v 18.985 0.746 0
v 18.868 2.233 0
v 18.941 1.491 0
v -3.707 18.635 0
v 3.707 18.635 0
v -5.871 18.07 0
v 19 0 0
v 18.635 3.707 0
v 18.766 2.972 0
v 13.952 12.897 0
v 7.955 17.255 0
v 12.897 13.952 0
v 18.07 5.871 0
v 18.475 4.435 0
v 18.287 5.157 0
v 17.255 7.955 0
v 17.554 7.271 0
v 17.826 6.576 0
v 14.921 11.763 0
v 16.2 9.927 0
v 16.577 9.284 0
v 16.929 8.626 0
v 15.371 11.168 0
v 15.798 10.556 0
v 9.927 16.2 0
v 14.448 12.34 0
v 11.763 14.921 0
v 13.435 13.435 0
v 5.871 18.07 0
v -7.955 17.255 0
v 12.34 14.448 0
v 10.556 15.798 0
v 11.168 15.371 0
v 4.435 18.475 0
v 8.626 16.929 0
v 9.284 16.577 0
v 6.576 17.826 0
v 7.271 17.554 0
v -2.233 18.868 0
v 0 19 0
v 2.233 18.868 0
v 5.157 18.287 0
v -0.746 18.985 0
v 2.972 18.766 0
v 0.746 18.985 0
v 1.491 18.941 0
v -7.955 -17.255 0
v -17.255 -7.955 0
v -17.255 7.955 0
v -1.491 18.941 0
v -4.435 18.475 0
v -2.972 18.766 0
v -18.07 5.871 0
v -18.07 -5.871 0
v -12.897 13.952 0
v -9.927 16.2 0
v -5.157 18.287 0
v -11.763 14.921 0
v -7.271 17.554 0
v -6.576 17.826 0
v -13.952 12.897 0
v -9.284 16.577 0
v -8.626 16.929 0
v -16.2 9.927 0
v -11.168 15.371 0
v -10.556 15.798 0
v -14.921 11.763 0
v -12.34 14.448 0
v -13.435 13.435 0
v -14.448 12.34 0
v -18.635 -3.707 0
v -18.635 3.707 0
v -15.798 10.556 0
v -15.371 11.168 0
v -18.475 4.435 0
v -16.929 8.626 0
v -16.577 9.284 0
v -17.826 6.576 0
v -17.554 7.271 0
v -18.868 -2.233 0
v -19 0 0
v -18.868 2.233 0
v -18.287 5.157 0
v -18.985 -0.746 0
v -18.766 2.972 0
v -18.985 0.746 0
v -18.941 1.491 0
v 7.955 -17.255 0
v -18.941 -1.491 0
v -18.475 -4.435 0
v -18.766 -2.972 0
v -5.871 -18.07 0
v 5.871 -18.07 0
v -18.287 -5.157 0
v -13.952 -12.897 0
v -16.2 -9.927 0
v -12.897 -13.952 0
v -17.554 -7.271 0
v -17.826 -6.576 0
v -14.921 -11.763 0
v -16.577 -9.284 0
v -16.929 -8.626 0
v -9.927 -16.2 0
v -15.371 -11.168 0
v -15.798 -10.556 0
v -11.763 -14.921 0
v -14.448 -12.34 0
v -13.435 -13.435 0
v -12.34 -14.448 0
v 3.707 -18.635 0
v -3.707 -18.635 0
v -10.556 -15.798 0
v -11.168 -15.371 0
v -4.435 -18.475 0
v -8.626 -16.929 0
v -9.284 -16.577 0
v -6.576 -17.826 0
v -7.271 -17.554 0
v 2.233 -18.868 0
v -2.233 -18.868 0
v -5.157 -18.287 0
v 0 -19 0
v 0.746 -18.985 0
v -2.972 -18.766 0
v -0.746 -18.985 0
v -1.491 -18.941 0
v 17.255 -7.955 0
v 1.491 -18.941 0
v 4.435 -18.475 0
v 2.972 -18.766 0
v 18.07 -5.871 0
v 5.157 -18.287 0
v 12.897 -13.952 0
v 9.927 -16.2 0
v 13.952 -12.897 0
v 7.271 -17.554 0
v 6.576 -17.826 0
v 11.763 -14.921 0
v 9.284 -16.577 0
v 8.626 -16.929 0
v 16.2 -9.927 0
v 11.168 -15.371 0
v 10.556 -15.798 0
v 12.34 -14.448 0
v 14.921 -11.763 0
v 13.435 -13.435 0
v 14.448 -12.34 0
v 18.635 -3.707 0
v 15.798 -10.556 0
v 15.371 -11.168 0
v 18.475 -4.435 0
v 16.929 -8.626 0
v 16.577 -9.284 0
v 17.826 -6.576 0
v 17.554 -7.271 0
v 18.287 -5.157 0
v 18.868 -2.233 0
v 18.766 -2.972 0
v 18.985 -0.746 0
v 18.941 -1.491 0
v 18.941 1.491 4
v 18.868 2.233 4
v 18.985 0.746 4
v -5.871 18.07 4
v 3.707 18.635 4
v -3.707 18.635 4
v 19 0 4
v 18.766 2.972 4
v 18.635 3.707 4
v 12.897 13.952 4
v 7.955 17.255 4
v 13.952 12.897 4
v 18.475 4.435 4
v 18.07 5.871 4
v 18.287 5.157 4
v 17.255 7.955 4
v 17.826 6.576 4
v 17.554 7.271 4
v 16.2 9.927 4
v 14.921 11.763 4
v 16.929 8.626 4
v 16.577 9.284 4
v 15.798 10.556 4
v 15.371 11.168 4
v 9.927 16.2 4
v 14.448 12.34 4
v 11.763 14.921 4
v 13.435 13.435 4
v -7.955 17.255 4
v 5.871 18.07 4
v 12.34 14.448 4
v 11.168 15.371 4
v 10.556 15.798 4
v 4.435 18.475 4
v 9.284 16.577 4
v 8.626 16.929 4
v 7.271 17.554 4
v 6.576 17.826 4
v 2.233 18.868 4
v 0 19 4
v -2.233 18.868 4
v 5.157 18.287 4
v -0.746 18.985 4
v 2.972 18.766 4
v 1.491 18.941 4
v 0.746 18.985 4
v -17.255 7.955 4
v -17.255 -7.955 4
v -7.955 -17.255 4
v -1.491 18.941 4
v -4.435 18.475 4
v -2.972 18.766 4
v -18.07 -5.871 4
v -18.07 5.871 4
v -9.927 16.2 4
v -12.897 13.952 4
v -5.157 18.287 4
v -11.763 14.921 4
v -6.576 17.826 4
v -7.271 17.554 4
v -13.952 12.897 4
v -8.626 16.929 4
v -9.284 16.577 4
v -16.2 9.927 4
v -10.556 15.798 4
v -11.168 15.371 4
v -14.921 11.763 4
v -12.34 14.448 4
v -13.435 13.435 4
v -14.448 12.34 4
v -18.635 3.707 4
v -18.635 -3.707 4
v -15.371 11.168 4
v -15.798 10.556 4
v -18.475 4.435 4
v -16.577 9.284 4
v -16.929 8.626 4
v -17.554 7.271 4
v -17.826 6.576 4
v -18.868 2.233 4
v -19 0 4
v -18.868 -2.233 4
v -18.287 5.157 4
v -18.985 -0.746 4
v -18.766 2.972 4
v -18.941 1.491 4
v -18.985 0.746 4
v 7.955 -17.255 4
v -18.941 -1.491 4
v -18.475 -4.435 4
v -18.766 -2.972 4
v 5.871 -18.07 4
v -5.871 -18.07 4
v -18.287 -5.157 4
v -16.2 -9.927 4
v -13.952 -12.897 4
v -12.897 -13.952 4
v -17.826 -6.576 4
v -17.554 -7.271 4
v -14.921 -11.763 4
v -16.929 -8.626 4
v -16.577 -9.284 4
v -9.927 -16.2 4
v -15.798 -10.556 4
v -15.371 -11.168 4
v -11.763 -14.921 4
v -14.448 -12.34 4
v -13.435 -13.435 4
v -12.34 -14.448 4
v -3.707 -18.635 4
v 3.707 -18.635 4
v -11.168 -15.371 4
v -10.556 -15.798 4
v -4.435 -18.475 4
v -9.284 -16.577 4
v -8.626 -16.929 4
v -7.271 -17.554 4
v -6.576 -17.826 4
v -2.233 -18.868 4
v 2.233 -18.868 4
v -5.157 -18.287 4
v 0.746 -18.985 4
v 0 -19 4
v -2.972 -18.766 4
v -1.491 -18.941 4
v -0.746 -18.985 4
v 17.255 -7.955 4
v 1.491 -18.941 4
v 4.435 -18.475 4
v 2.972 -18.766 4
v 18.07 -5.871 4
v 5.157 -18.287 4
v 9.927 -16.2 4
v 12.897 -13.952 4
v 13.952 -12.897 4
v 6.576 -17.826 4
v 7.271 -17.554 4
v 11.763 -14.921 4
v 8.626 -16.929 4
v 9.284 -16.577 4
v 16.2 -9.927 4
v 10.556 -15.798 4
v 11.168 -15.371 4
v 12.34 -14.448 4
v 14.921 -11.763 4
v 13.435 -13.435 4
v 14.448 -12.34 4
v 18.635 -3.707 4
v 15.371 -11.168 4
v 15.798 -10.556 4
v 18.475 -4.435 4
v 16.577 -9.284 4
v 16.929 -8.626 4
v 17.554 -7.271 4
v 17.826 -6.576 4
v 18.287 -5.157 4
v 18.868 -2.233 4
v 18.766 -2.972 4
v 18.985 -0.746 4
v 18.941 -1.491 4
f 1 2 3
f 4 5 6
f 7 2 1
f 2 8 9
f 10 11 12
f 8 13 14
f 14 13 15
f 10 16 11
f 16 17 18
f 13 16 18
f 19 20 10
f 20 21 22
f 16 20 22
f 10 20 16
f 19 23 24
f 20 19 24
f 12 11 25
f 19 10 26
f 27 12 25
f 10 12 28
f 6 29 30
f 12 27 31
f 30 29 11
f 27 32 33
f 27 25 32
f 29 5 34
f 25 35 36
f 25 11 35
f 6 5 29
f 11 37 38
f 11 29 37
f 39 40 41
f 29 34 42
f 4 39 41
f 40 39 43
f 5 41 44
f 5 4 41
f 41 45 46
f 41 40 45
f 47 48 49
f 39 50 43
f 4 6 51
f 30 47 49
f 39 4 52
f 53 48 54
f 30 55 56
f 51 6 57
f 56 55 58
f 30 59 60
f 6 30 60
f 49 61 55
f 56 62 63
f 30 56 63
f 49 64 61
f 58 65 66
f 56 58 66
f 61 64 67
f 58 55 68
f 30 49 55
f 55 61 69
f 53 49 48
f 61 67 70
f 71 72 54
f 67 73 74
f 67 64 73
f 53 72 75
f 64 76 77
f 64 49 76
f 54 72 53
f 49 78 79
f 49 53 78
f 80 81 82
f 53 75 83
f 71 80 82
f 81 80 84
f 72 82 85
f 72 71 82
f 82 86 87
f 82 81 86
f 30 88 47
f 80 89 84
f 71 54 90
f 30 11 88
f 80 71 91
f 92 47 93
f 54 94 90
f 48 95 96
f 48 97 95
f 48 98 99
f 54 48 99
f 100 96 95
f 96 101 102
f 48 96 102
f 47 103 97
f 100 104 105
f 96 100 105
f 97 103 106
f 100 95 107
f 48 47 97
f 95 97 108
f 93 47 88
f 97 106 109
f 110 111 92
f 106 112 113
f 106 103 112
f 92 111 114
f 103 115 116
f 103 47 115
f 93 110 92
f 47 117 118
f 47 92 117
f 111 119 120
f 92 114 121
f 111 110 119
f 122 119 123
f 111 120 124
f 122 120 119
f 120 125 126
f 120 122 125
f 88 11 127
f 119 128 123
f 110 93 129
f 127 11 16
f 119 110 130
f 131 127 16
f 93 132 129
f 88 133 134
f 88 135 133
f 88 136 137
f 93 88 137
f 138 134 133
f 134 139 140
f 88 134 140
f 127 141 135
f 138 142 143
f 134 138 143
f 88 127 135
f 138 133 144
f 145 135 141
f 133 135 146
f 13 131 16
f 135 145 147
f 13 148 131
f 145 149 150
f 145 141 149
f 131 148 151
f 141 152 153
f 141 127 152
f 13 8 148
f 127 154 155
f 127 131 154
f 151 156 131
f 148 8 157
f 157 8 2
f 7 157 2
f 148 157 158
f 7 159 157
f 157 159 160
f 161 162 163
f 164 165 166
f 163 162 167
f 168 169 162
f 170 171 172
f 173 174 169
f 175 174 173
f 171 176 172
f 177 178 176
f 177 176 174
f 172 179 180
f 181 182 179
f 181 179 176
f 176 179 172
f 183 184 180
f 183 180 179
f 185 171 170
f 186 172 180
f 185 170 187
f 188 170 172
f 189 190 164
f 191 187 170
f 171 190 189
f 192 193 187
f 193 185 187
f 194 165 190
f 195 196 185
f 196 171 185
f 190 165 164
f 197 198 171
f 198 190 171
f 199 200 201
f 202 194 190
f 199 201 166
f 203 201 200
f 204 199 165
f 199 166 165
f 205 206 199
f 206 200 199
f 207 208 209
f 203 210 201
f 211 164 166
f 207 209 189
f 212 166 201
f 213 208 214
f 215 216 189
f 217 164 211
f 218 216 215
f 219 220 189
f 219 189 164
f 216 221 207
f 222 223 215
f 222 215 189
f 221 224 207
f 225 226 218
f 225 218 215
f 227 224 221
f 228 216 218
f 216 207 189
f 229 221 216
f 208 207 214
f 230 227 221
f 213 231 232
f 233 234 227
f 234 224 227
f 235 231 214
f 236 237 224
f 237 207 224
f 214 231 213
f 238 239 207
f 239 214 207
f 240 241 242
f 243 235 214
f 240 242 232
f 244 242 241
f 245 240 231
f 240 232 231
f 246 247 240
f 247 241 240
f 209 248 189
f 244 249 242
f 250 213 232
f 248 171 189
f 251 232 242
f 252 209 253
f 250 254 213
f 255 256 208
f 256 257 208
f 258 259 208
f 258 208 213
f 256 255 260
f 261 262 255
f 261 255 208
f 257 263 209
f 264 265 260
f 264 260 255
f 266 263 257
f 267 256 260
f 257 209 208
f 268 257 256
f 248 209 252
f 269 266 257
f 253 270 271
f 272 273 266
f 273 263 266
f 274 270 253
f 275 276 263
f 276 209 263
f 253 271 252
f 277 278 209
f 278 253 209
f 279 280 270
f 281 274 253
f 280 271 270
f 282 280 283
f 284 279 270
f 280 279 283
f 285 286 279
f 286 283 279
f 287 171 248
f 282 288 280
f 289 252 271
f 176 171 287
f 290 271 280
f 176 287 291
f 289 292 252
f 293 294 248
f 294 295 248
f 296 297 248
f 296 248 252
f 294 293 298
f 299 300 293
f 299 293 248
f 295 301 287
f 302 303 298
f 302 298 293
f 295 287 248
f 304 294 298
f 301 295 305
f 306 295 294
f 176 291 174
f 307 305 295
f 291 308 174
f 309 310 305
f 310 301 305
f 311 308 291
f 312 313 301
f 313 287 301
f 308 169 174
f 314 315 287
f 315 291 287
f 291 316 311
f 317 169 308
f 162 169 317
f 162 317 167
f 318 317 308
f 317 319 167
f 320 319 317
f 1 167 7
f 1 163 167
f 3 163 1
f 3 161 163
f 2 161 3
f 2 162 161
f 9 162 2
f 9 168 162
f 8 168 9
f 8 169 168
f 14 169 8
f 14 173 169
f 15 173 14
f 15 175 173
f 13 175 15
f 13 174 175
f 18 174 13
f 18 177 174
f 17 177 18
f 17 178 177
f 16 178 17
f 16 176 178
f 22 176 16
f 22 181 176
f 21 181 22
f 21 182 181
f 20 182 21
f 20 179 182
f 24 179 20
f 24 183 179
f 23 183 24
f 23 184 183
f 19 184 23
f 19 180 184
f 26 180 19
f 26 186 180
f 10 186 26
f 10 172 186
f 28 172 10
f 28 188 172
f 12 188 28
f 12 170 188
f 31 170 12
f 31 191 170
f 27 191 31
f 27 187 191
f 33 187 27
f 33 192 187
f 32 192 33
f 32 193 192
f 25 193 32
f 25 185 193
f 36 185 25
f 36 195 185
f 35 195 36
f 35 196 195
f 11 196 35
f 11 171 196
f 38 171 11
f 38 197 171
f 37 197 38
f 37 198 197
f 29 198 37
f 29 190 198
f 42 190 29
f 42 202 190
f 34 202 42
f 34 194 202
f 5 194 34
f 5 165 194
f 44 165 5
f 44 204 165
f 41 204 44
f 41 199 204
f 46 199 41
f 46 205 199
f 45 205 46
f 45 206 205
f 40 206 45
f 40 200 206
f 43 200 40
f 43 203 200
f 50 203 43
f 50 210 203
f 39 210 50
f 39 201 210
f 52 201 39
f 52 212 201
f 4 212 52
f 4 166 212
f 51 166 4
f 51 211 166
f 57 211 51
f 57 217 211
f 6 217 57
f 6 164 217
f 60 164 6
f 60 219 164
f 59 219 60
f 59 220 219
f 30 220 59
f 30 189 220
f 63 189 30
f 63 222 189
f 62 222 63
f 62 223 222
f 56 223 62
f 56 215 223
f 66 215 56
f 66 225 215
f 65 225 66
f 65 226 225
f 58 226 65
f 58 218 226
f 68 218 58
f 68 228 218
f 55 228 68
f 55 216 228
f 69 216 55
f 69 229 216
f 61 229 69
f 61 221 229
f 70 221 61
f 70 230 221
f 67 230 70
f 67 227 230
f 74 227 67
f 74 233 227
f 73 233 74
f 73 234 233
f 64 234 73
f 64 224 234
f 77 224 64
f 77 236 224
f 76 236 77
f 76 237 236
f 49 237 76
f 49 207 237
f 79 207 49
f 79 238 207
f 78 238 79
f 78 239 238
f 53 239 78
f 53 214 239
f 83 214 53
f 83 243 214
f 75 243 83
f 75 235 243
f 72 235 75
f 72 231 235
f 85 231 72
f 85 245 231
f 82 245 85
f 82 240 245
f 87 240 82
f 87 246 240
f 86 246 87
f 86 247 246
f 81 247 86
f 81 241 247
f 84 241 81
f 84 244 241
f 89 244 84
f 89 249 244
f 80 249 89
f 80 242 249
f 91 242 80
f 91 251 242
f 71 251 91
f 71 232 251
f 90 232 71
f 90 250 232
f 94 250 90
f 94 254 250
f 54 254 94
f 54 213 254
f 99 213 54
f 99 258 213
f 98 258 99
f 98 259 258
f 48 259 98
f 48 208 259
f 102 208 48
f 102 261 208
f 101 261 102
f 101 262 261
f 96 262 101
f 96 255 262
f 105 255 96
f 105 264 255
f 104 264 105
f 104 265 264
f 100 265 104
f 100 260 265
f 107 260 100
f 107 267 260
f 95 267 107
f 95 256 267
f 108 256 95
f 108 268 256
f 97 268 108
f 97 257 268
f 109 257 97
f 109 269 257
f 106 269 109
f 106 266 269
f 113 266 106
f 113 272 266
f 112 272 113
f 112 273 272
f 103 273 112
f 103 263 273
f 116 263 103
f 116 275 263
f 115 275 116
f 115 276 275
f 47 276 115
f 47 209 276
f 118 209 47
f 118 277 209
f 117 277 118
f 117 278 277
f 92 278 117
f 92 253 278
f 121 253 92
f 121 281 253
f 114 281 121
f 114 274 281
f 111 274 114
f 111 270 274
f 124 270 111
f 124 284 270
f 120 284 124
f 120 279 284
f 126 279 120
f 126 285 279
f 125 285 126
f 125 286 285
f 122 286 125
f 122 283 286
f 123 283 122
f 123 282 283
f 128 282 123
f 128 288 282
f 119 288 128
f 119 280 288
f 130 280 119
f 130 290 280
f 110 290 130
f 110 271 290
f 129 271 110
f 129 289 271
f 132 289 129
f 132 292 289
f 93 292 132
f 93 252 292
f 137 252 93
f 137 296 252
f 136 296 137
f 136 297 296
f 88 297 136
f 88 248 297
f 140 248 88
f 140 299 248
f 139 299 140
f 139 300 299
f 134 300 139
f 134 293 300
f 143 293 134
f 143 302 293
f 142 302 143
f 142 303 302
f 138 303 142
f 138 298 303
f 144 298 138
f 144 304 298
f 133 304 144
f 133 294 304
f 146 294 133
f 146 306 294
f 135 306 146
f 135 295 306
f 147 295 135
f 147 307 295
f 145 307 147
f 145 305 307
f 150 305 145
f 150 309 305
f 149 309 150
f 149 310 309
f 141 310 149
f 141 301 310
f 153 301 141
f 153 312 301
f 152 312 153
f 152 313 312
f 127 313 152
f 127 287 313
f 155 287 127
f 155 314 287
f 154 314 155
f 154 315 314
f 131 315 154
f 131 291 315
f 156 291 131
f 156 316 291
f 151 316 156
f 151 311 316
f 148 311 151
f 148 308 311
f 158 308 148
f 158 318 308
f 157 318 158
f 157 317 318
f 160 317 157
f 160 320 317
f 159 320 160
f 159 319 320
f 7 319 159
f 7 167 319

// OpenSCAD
// scad/keychain_template.scad
$fn = 160;

// --------------------
// Parameters (overridden by -D)
// --------------------
base_form = "circle";              // circle | rounded_polygon | heart | droplet | bolt | wave | sun | star | flame | spike
size_mm = 38;
thickness_mm = 4.0;

rounded_polygon_sides = 8;
fillet_mm = 2.0;

twist_deg = 0;

// Organic edge (some shapes use this subtly)
noise_amp_mm = 0.0;                // 0.. ~2.5
noise_seed = 1337;

// symmetry count (used by wavy circle/wave/sun/star/spike)
sym_n = 7;

// Holes: [[x,y,r], ...]
holes = [];

// --------------------
// Helpers
// --------------------
function clamp(x,a,b) = x < a ? a : (x > b ? b : x);
function ph(seed) = (seed % 360);

module holes_2d(holes=[]) {
    for (h = holes) translate([h[0], h[1]]) circle(r=h[2]);
}

// Generic wavy circle for “organic” look
module wavy_circle_2d(d=38, amp=1.0, n=7, seed=1337, steps=240) {
    r0 = d/2;
    phase = ph(seed);
    pts = [
        for (i=[0:steps-1])
            let(
                t = 360*i/steps,
                wob = amp * (0.70*sin(n*t + phase) + 0.30*sin((n*2+1)*t + phase*0.37)),
                rr = r0 + wob
            )
            [ rr*cos(t), rr*sin(t) ]
    ];
    polygon(points=pts);
}

// Rounded polygon base (soft corners)
module rounded_poly_2d(d=38, sides=8, fillet=2.0) {
    r = d/2;
    pts = [ for (i=[0:sides-1]) [ r*cos(360*i/sides), r*sin(360*i/sides) ] ];
    offset(r=fillet) offset(delta=-fillet) polygon(points=pts);
}

// HEART (iconic)
module heart_2d(d=38) {
    // Heart built in ~40 units width, then scaled
    s = d / 40;
    scale([s,s]) union() {
        translate([-10, 8]) circle(r=12);
        translate([ 10, 8]) circle(r=12);
        polygon(points=[[ -22, 8], [ 22, 8], [ 0, -26]]);
    }
}

// DROPLET (teardrop)
module droplet_2d(d=38) {
    // top round + bottom point
    s = d / 40;
    scale([s,s]) union() {
        translate([0, 8]) circle(r=14);
        polygon(points=[[ -14, 8], [ 14, 8], [ 0, -26]]);
    }
}

// BOLT (lightning)
module bolt_2d(d=38) {
    // simple lightning polygon (scaled)
    s = d / 40;
    scale([s,s]) polygon(points=[
        [-6, 18], [ 8, 18], [ 0, 2],
        [10, 2], [-8, -22], [-2, -4],
        [-12, -4]
    ]);
}

// WAVE (calm)
module wave_2d(d=38, amp=1.0, n=6, seed=1337) {
    // Rounded “pebble” base with a gentle wavy offset on one axis
    // Implemented as wavy circle but with lower amp; looks calm & smooth
    wavy_circle_2d(d=d, amp=amp, n=n, seed=seed, steps=220);
}

// SUN (joy)
module sun_2d(d=38, rays=10, seed=1337) {
    // radial spikes but rounded-ish: alternate radii
    r0 = d/2 * 0.78;
    r1 = d/2 * 1.00;
    steps = rays * 2;
    phase = ph(seed);
    pts = [
        for (i=[0:steps-1])
            let(
                t = 360*i/steps + phase,
                rr = (i % 2 == 0) ? r1 : r0
            )
            [ rr*cos(t), rr*sin(t) ]
    ];
    offset(r=fillet_mm) offset(delta=-fillet_mm) polygon(points=pts);
}

// STAR (surprise)
module star_2d(d=38, pointsN=10, seed=1337) {
    // 5-point star by default (pointsN=10 means 5 outer+inner)
    r1 = d/2 * 1.00;
    r0 = d/2 * 0.45;
    steps = pointsN;
    phase = ph(seed);
    pts = [
        for (i=[0:steps-1])
            let(
                t = 360*i/steps + phase,
                rr = (i % 2 == 0) ? r1 : r0
            )
            [ rr*cos(t), rr*sin(t) ]
    ];
    offset(r=fillet_mm) offset(delta=-fillet_mm) polygon(points=pts);
}

// FLAME (anger)
module flame_2d(d=38, seed=1337) {
    // stylized flame silhouette
    s = d / 40;
    scale([s,s]) polygon(points=[
        [0, 20],
        [8, 10],
        [6, 2],
        [12, -4],
        [6, -18],
        [0, -26],
        [-6, -18],
        [-12, -4],
        [-6, 2],
        [-8, 10]
    ]);
    // soften corners
    // (offset done at caller)
}

// SPIKE (fear)
module spike_2d(d=38, spikes=9, seed=1337) {
    // similar to sun but sharper spikes
    r0 = d/2 * 0.65;
    r1 = d/2 * 1.05;
    steps = spikes * 2;
    phase = ph(seed);
    pts = [
        for (i=[0:steps-1])
            let(
                t = 360*i/steps + phase,
                rr = (i % 2 == 0) ? r1 : r0
            )
            [ rr*cos(t), rr*sin(t) ]
    ];
    polygon(points=pts);
}

// --------------------
// Base selector
// --------------------
module base_2d() {
    amp = clamp(noise_amp_mm, 0, 3);
    n   = max(3, sym_n);

    if (base_form == "circle") {
        if (amp > 0.001) wavy_circle_2d(d=size_mm, amp=amp, n=n, seed=noise_seed);
        else circle(d=size_mm);
    }
    else if (base_form == "rounded_polygon") {
        rounded_poly_2d(d=size_mm, sides=max(3,rounded_polygon_sides), fillet=fillet_mm);
    }
    else if (base_form == "heart") {
        heart_2d(d=size_mm);
    }
    else if (base_form == "droplet") {
        droplet_2d(d=size_mm);
    }
    else if (base_form == "bolt") {
        // lightning should be slightly softened
        offset(r=fillet_mm) offset(delta=-fillet_mm) bolt_2d(d=size_mm);
    }
    else if (base_form == "wave") {
        // calm wave: low amp looks good
        wave_2d(d=size_mm, amp=max(0.3, amp), n=n, seed=noise_seed);
    }
    else if (base_form == "sun") {
        sun_2d(d=size_mm, rays=max(7,n), seed=noise_seed);
    }
    else if (base_form == "star") {
        star_2d(d=size_mm, pointsN=10, seed=noise_seed);
    }
    else if (base_form == "flame") {
        offset(r=fillet_mm) offset(delta=-fillet_mm) flame_2d(d=size_mm, seed=noise_seed);
    }
    else if (base_form == "spike") {
        // keep sharp: only tiny fillet if you want
        spike_2d(d=size_mm, spikes=max(7,n), seed=noise_seed);
    }
    else {
        // default fallback
        circle(d=size_mm);
    }
}

// --------------------
// Model
// --------------------
difference() {
    linear_extrude(height=thickness_mm, twist=twist_deg, convexity=10)
        base_2d();

    if (len(holes) > 0) {
        translate([0,0,-1])
            linear_extrude(height=thickness_mm+2, convexity=10)
                holes_2d(holes);
    }
}
